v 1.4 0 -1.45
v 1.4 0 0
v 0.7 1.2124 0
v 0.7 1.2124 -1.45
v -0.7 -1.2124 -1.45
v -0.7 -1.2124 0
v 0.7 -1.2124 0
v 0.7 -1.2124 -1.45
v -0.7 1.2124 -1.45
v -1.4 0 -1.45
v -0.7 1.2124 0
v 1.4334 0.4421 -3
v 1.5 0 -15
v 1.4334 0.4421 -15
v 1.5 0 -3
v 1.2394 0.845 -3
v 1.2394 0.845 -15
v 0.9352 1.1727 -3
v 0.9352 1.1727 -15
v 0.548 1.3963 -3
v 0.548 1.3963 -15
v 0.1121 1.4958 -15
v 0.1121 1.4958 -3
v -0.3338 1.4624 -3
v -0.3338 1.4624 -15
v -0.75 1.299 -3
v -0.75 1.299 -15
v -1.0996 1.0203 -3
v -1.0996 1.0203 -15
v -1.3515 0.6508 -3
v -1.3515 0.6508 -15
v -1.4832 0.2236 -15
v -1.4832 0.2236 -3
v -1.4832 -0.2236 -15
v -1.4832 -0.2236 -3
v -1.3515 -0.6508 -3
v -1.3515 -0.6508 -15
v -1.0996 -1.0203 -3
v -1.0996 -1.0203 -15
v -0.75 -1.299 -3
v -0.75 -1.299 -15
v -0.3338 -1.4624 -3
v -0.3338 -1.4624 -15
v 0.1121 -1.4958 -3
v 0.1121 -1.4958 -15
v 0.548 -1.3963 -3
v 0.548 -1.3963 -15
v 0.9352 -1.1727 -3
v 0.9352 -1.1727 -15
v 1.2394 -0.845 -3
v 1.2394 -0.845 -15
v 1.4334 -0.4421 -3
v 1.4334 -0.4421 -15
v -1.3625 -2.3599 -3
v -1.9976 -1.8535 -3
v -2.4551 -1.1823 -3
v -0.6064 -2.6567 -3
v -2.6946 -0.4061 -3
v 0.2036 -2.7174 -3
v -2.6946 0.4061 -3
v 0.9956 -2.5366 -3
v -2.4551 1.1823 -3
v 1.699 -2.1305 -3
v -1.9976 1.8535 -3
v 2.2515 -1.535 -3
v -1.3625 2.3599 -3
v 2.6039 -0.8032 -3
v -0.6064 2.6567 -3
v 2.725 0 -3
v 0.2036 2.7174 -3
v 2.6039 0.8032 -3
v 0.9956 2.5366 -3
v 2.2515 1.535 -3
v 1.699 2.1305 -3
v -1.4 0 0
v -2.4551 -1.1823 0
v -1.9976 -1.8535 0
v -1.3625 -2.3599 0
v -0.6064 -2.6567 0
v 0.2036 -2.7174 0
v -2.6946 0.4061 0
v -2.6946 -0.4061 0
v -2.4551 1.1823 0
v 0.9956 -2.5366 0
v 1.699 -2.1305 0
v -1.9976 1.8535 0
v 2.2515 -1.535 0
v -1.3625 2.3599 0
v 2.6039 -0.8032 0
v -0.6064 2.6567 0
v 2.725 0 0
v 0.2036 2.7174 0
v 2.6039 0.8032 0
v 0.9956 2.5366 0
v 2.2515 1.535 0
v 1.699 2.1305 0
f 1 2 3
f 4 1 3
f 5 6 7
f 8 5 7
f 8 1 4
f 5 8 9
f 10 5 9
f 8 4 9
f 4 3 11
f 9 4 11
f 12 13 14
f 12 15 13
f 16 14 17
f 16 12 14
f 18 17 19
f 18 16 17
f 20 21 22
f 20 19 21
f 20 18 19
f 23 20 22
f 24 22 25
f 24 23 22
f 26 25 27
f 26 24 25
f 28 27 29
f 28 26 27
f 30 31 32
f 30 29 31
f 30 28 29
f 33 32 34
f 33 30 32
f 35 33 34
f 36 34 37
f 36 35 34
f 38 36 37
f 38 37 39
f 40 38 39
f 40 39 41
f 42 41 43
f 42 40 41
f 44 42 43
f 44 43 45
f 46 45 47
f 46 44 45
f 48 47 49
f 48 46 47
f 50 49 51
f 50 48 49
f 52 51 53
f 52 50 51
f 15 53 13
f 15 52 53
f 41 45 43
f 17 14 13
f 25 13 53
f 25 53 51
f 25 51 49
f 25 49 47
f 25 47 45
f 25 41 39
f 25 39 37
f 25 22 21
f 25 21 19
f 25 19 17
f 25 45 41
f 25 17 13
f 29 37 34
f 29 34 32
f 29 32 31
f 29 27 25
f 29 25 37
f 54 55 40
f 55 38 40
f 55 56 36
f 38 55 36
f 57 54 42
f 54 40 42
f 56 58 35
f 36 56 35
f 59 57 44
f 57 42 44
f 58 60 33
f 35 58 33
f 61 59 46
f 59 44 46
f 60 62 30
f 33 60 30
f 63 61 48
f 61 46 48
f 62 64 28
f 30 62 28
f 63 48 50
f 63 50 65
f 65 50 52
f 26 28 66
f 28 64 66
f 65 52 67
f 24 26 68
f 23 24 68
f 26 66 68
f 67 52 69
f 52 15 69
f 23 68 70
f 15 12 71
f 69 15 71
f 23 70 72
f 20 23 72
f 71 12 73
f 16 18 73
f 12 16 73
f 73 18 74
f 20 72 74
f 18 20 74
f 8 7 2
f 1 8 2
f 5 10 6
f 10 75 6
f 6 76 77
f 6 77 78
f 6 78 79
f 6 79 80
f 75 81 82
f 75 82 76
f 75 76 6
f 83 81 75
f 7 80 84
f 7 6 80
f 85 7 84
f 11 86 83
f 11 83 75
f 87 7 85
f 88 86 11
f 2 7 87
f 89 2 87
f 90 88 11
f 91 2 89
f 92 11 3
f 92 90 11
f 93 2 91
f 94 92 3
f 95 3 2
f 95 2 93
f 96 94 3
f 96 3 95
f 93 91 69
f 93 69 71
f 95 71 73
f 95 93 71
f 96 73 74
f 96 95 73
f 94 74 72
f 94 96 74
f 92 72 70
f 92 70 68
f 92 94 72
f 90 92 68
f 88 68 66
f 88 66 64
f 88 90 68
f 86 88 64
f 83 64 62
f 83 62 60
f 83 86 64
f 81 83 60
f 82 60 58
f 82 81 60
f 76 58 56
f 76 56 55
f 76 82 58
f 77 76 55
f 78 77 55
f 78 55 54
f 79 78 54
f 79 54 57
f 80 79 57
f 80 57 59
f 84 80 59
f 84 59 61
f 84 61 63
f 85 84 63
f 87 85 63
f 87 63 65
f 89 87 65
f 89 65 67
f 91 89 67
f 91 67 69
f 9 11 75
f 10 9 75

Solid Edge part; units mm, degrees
sketch "Sketch1" plane through (0, 0, 0) normal (0, 0, 1) x (1, 0, 0)
  circle A0 centre (0, 0) radius 2.725
extrude "Protrusion1" add sketch "Sketch1" against normal blind 3
sketch "Sketch2" plane through (0, 0, 0) normal (0, 0, 1) x (1, 0, 0)
  line L0 (-0.7, -1.2124) -> (-1.05, -0.6062)
  line L1 (-1.4, 0) -> (-1.05, -0.6062)
  line L2 (-1.4, 0) -> (-1.05, 0.6062)
  line L3 (-0.7, 1.2124) -> (-1.05, 0.6062)
  line L4 (-0.7, 1.2124) -> (0, 1.2124)
  line L5 (0.7, 1.2124) -> (0, 1.2124)
  line L6 (0.7, 1.2124) -> (1.05, 0.6062)
  line L7 (1.4, 0) -> (1.05, 0.6062)
  line L8 (1.4, 0) -> (1.05, -0.6062)
  line L9 (0.7, -1.2124) -> (1.05, -0.6062)
  line L10 (0.7, -1.2124) -> (0, -1.2124)
  line L11 (-0.7, -1.2124) -> (0, -1.2124)
extrude "ExtrudedCutout_1" cut sketch "Sketch2" against normal blind 1.45
sketch "Sketch3" plane through (0, 0, -3) normal (0, 0, -1) x (1, 0, 0)
  circle A0 centre (0, 0) radius 1.5
extrude "ExtrudedProtrusion_2" add sketch "Sketch3" along normal blind 12
cosmetic_thread "Thread1" size "M3"
properties material "Stainless steel"
